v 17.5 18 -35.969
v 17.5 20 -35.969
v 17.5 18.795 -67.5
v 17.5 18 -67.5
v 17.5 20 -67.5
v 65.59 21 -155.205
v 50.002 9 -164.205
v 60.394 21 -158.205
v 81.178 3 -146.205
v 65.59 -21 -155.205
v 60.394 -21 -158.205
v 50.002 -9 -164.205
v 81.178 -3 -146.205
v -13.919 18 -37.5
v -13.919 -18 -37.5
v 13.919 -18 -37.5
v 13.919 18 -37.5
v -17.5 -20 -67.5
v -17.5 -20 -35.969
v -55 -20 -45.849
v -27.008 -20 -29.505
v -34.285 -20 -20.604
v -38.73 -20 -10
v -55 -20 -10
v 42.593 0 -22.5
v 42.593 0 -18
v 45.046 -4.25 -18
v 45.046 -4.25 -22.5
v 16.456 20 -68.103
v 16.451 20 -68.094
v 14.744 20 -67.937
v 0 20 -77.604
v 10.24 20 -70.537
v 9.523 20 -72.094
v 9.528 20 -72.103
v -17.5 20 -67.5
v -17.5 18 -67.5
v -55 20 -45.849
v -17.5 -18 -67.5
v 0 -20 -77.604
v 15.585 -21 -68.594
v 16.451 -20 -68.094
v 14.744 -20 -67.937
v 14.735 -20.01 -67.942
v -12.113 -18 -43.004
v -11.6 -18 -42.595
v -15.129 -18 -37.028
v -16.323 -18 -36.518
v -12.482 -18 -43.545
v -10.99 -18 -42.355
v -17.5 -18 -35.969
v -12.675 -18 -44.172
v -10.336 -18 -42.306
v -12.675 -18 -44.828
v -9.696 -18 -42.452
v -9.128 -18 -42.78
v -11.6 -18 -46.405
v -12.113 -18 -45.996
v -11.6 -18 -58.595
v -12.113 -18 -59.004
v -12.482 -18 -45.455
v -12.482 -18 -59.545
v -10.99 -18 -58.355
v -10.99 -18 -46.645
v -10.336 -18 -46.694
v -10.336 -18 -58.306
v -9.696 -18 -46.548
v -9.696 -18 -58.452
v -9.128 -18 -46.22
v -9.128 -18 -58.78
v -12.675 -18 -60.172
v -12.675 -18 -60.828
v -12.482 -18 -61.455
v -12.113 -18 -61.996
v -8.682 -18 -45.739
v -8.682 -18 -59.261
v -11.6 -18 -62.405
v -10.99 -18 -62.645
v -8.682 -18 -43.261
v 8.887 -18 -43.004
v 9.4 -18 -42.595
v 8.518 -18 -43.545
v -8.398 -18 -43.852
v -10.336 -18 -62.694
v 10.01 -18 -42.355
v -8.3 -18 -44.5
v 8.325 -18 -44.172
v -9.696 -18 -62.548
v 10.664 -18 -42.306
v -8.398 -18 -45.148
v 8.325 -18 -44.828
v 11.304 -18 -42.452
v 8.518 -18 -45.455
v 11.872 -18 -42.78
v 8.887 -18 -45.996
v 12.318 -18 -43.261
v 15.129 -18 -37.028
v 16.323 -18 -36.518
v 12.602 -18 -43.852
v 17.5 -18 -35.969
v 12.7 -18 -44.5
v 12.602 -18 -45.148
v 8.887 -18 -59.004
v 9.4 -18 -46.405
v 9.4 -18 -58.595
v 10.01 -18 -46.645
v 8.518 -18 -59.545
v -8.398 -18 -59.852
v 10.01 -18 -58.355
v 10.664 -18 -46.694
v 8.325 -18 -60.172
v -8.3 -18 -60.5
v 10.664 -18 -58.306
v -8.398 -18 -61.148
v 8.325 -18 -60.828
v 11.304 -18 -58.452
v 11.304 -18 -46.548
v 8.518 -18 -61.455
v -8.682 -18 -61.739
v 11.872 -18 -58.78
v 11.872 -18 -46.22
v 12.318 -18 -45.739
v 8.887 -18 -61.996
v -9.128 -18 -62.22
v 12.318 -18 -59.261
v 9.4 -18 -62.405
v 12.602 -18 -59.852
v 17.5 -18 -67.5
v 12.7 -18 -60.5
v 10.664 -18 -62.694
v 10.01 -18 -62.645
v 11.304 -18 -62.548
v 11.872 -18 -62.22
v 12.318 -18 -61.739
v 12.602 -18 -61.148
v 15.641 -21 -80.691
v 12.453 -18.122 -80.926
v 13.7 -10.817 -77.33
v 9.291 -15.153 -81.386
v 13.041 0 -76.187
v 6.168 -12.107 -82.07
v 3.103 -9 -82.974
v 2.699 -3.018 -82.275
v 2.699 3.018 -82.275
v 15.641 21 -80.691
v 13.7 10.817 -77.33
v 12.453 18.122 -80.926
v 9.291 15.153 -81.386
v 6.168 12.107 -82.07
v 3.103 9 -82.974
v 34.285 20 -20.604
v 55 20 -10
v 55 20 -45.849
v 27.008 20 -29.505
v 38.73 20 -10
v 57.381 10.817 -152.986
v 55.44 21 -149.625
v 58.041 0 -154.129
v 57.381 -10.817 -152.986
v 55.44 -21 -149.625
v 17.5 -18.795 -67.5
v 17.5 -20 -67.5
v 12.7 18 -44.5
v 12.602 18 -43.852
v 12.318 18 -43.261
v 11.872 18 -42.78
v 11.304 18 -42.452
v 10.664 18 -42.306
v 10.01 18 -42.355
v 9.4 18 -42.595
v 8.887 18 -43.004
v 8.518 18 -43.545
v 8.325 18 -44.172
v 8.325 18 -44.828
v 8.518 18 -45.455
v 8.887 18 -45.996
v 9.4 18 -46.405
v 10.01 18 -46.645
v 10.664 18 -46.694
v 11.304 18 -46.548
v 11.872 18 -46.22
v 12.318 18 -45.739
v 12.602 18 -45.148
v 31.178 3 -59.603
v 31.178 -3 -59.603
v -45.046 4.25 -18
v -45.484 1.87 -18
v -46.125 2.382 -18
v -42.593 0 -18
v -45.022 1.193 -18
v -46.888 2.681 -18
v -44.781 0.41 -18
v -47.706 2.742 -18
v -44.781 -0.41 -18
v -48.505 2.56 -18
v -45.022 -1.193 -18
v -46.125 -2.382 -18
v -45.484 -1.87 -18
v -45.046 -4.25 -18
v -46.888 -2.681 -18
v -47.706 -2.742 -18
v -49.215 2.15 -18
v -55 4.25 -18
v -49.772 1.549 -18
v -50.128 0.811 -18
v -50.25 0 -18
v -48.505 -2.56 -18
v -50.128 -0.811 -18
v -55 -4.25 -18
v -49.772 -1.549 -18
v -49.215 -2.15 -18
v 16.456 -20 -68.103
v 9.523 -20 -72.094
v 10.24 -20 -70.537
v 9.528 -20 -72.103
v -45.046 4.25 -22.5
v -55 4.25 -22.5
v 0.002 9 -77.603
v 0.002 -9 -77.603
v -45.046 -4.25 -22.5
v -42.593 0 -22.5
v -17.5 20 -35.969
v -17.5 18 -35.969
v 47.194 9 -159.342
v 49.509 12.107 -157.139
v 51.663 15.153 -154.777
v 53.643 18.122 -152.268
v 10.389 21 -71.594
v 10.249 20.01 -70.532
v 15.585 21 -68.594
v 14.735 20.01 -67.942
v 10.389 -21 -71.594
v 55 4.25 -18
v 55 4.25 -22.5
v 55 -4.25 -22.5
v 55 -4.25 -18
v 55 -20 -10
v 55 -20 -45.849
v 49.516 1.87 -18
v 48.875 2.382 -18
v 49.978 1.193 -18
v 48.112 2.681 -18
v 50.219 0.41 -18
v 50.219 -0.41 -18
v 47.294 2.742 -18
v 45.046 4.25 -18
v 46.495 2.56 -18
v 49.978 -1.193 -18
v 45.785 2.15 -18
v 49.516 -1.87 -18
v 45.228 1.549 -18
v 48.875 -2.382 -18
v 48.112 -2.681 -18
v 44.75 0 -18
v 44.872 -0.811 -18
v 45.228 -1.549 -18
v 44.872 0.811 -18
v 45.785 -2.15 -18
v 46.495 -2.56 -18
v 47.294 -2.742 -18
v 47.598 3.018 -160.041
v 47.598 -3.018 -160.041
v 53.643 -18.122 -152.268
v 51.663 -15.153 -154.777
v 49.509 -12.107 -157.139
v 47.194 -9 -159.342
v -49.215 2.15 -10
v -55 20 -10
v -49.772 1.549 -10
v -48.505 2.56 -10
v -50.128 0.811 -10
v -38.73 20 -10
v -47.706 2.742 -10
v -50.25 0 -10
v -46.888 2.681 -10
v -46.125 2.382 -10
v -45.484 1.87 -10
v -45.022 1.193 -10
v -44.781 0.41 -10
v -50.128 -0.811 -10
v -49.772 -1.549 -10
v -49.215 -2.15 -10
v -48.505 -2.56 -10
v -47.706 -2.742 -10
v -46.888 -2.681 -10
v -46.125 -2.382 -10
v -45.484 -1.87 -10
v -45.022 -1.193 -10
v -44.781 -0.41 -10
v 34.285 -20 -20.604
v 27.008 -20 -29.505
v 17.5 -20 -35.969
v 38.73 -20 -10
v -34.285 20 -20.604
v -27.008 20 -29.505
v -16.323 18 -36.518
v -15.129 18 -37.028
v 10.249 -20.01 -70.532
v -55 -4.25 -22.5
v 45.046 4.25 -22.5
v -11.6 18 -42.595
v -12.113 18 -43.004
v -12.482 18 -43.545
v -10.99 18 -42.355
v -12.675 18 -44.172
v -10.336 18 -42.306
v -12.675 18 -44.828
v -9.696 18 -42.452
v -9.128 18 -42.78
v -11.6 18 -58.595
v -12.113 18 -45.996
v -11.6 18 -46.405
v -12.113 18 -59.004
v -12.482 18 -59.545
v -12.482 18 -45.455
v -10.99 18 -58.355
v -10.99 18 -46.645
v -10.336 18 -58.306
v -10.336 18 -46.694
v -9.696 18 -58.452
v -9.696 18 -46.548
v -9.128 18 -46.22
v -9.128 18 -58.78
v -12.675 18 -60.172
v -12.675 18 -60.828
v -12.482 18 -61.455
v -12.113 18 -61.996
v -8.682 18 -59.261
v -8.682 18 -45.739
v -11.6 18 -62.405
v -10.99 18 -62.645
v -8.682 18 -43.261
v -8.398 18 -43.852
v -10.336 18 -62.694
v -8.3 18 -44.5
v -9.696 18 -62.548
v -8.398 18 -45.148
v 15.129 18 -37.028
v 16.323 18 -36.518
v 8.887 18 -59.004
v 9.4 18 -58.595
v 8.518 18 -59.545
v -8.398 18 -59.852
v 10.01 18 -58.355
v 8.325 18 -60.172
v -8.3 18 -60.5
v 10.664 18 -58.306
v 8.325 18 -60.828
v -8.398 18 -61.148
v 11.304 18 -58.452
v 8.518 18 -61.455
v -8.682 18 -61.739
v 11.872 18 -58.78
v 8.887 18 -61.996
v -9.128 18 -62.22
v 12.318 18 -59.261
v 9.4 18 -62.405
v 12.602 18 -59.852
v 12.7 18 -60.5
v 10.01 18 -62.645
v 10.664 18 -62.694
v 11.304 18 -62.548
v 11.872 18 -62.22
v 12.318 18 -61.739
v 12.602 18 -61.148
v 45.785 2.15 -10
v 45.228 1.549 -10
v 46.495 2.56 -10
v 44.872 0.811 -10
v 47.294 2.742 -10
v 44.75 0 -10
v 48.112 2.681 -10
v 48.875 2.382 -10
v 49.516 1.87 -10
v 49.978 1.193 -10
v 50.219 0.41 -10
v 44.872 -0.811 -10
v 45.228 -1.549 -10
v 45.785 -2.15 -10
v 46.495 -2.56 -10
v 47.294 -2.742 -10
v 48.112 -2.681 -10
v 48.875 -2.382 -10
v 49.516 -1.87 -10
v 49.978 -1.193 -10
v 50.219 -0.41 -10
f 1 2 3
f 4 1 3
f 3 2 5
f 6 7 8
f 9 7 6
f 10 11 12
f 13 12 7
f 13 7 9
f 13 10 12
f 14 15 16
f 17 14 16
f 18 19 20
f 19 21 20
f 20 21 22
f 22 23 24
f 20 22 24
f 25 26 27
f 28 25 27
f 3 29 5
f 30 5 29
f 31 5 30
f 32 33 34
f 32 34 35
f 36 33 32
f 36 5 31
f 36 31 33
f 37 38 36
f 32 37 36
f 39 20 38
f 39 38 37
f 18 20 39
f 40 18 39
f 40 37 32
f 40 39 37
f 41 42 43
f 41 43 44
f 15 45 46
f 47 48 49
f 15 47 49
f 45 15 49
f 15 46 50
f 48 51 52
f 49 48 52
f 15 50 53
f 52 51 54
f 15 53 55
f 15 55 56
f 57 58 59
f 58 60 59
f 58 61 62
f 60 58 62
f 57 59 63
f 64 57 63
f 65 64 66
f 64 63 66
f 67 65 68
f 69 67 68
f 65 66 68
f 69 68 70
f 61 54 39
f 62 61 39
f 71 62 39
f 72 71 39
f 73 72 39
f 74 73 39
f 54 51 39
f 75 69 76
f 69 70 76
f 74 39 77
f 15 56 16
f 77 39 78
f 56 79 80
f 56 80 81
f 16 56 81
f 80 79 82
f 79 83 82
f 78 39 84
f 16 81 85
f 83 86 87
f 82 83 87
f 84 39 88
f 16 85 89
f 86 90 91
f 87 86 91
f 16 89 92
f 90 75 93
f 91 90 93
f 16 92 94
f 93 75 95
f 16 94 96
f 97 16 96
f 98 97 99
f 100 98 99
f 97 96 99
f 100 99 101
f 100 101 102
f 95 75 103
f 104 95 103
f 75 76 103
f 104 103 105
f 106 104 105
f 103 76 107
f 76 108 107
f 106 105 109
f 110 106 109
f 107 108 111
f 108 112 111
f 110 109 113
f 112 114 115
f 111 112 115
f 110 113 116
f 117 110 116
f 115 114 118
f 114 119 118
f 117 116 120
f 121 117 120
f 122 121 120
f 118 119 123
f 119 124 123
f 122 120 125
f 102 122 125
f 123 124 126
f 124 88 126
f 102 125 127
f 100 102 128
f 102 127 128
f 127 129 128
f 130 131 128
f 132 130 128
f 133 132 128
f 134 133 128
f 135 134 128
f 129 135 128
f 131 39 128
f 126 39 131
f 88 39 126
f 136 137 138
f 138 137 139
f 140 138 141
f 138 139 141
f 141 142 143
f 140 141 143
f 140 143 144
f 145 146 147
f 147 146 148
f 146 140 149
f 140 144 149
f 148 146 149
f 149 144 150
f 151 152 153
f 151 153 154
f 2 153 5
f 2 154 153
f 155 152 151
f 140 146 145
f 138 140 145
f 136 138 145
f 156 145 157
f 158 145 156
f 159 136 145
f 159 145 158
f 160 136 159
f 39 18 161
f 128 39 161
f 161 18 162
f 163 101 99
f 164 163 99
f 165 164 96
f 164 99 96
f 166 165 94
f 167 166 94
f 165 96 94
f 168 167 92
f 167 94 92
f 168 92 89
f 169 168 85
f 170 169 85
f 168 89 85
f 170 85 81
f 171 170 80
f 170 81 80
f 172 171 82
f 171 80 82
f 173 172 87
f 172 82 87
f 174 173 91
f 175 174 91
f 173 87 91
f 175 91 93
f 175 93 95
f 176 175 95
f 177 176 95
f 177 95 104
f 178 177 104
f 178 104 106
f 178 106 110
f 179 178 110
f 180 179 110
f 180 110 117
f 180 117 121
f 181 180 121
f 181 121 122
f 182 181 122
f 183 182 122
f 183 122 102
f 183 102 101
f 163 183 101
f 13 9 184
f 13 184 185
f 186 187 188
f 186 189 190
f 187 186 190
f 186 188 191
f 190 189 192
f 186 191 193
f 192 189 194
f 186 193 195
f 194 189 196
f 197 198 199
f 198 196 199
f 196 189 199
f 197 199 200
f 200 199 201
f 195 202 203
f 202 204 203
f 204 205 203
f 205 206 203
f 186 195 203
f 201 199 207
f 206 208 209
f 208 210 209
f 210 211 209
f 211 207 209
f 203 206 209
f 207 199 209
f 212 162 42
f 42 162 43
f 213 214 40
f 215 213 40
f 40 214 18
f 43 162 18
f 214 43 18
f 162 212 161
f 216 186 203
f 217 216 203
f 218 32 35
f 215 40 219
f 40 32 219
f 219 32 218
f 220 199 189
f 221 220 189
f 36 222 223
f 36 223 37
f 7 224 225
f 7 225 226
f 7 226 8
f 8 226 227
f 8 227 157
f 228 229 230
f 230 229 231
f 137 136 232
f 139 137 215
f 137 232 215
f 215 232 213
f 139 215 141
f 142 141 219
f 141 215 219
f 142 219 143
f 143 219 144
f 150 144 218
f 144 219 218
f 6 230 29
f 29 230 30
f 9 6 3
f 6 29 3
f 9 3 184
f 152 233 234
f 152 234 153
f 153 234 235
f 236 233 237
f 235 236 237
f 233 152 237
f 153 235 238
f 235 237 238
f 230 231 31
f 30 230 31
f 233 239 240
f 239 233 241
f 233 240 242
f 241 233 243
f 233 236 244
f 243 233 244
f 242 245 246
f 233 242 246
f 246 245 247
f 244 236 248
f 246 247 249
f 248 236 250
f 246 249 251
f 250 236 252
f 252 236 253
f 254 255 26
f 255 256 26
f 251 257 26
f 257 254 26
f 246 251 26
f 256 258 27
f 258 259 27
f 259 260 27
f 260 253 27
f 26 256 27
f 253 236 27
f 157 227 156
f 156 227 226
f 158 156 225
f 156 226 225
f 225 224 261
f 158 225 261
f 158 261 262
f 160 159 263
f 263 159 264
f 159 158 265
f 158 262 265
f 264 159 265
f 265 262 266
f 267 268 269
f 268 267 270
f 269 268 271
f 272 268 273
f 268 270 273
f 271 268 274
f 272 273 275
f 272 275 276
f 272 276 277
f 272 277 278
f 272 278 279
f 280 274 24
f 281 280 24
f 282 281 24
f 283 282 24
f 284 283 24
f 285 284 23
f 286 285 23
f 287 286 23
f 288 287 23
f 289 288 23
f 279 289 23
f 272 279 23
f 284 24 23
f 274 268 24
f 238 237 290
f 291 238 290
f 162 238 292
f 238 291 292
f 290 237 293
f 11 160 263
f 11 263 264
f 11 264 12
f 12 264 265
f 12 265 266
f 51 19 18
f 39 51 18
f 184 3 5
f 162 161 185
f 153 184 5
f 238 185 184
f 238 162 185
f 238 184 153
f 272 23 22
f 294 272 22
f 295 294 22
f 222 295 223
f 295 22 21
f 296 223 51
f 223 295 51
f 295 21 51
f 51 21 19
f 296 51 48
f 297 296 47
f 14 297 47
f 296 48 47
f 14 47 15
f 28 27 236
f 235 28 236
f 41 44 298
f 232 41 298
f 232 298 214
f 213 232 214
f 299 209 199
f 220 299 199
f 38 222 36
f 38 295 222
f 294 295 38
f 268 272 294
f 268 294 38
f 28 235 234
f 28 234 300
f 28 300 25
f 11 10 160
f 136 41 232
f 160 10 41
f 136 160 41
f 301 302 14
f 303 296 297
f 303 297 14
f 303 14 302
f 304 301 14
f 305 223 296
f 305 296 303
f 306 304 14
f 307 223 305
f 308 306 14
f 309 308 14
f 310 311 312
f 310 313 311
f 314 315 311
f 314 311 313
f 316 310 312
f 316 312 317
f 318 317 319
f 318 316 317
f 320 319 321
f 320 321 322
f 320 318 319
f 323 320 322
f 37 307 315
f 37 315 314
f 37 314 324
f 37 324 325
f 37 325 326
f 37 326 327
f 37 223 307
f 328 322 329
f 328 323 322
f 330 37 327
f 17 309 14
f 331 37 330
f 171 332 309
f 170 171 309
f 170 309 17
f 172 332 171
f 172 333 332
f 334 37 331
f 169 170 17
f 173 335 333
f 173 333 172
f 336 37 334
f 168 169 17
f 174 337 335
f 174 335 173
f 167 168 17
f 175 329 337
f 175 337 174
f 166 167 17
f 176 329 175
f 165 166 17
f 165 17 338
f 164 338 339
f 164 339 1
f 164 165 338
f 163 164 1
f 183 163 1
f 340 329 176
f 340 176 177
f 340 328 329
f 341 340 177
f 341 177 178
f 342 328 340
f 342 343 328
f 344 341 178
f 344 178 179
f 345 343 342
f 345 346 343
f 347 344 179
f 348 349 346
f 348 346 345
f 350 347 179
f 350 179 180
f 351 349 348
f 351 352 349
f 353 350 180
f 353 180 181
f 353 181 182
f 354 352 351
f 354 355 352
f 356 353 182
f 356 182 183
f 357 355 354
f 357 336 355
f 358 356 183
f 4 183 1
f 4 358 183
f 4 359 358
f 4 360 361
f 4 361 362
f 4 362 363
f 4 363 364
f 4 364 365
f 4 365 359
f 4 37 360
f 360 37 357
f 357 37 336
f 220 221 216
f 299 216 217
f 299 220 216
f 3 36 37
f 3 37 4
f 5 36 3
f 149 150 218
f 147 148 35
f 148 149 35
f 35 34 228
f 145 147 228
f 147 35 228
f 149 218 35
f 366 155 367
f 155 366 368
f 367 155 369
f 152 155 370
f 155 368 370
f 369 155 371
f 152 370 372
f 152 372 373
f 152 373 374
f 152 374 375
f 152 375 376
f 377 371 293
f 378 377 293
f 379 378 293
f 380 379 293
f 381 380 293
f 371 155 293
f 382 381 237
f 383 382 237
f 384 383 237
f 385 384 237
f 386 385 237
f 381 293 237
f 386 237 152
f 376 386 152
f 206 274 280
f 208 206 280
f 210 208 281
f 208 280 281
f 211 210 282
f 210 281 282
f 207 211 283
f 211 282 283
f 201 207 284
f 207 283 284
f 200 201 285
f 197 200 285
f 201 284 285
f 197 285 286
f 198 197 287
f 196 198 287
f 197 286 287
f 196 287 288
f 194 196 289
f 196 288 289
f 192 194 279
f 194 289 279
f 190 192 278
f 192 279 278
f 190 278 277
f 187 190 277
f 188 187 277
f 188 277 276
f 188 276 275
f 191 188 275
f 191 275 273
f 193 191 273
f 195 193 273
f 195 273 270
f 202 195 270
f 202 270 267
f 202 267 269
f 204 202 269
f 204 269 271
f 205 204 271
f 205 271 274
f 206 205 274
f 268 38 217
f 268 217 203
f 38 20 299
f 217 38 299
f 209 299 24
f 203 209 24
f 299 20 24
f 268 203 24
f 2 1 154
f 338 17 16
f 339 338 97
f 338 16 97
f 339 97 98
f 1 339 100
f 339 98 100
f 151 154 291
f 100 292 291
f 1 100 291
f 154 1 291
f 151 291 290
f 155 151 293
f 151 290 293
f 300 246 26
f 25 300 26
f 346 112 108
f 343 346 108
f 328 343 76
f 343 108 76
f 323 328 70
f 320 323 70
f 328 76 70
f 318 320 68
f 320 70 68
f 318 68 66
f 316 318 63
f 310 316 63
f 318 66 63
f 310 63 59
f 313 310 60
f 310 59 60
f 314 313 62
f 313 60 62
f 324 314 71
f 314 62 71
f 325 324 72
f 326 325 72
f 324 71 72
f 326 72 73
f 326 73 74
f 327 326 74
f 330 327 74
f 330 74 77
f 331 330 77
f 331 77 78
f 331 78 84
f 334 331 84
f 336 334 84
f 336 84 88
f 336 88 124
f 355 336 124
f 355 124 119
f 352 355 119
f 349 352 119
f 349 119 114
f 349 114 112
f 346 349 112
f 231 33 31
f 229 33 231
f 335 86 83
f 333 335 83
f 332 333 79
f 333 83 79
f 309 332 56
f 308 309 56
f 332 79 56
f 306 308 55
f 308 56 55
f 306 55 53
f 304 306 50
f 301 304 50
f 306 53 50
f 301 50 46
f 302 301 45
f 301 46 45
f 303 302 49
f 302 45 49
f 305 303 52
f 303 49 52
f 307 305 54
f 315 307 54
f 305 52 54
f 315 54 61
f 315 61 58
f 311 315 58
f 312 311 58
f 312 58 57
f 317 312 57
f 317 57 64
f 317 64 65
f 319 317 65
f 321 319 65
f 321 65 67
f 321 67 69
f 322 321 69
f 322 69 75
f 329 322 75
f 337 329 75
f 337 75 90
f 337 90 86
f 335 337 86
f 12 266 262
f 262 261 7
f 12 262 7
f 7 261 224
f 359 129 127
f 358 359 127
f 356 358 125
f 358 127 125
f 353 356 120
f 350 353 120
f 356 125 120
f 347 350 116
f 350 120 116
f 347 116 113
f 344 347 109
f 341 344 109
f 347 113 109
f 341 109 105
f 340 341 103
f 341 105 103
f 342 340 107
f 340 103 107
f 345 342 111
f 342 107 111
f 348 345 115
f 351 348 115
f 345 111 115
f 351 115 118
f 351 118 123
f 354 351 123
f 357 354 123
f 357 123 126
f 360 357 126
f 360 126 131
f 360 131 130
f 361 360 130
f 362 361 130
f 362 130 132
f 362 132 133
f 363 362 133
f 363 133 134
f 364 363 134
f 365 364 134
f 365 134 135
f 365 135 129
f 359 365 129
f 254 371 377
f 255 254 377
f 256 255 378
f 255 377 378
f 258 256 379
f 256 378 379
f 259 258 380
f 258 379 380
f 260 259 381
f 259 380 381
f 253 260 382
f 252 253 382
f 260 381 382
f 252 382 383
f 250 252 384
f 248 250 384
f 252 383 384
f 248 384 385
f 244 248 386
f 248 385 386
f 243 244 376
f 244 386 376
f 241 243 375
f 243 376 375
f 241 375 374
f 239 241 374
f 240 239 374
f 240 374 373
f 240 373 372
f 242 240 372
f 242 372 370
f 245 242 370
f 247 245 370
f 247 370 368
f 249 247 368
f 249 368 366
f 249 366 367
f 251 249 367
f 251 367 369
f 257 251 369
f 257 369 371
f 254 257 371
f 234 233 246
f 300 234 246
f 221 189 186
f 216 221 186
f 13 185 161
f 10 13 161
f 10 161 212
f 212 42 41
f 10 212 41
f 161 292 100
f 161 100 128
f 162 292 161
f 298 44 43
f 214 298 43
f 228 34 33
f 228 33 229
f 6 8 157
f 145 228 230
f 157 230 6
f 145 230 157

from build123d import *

# Parameters (mm, degrees)
PAD_DEPTH       = 20
SKETCH003_R     = 2.2
HOLE_DEPTH      = 40.001
POCKET001_DEPTH = 4.5
SKETCH007_R     = 2.75
HOLE001_DEPTH   = 12
PAD001_DEPTH    = 101
SKETCH011_R     = 45
HOLE002_DEPTH   = 12
CHAMFER_SIZE    = 0.99
SKETCH009_W     = 35
SKETCH009_H     = 67.5
POCKET_DEPTH    = 2


with BuildPart() as part:
    # Sketch → Pad (new body, symmetric)
    with BuildSketch(Plane.XZ):
        with BuildLine():
            ThreePointArc((13.9194109071, -37.5), (29.6992968462, -26.794621976), (38.7298334621, -10))
            Line((38.7298334621, -10), (55, -10))
            Line((55, -10), (55, -45.8493649054))
            Line((0, -77.6036297108), (55, -45.8493649054))
            Line((-55, -45.8493649054), (0, -77.6036297108))
            Line((-55, -45.8493649054), (-55, -10))
            Line((-55, -10), (-38.7298334621, -10))
            ThreePointArc((-38.7298334621, -10), (-29.6992968462, -26.794621976), (-13.9194109071, -37.5))
            Line((-13.9194109071, -37.5), (13.9194109071, -37.5))
        make_face()
    extrude(amount=PAD_DEPTH, both=True)

    # Sketch003 → Hole (cut, through all)
    with BuildSketch(Plane.XZ.offset(20)):
        with Locations((-10.5, -44.5)):
            Circle(SKETCH003_R)
        with Locations((10.5, -44.5)):
            Circle(SKETCH003_R)
        with Locations((-10.5, -60.5)):
            Circle(SKETCH003_R)
        with Locations((10.5, -60.5)):
            Circle(SKETCH003_R)
    extrude(amount=-HOLE_DEPTH, mode=Mode.SUBTRACT)

    # Sketch006 → Pocket001 (cut)
    with BuildSketch(Plane(origin=(0, 0, -18), x_dir=(-1, 0, 0), z_dir=(0, 0, 1))):
        Polygon((55, 4.25), (45.0462616441, 4.25), (42.592523, 0), (45.0462616441, -4.25), (55, -4.25), align=None)
        Polygon((-55, 4.25), (-55, -4.25), (-45.0462616441, -4.25), (-42.592523, 0), (-45.0462616441, 4.25), align=None)
    extrude(amount=-POCKET001_DEPTH, mode=Mode.SUBTRACT)

    # Sketch007 (on Face5 of Pocket001) → Hole001 (cut)
    with BuildSketch(Plane(origin=(0, 0, -10), x_dir=(-1, 0, 0), z_dir=(0, 0, 1))):
        with Locations((47.5, 0)):
            Circle(SKETCH007_R)
        with Locations((-47.5, 0)):
            Circle(SKETCH007_R)
    extrude(amount=-HOLE001_DEPTH, mode=Mode.SUBTRACT)

    # Sketch010 (on Face10 of Hole001) → Pad001 (join)
    with BuildSketch(Plane(origin=(33.1033573777, 0, -57.3366968793), x_dir=(0.8660254038, 0, 0.5), z_dir=(0.5, 0, -0.8660254038))):
        Polygon((-38.8, 9), (-38.8, -9), (-26.8, -21), (-20.8, -21), (-2.8, -3), (-2.8, 3), (-20.8, 21), (-26.8, 21), align=None)
    extrude(amount=PAD001_DEPTH)

    # Sketch011 (on Face30 of Pad001) → Hole002 (cut)
    with BuildSketch(Plane(origin=(-33.6017856668, 0, -19.4), x_dir=(0.5, 0, -0.8660254038), z_dir=(-0.8660254038, 0, -0.5))):
        with Locations((117.5, 0)):
            Circle(SKETCH011_R)
    extrude(amount=-HOLE002_DEPTH, mode=Mode.SUBTRACT)

    # Chamfer
    chamfer_edges = [part.edges().sort_by_distance(p)[0] for p in [
        (9.460864, 20.5, -70.986697),
        (12.491953, 21, -69.236697),
        (15.523042, 20.5, -67.486697),
        (15.523042, -20.5, -67.486697),
        (12.491953, -21, -69.236697),
        (9.460864, -20.5, -70.986697),
    ]]
    chamfer(chamfer_edges, length=CHAMFER_SIZE)

    # Sketch009 → Pocket (cut)
    with BuildSketch(Plane(origin=(0, 20, 0), x_dir=(1, 0, 0), z_dir=(0, 1, 0))):
        with Locations((0, 33.75)):
            Rectangle(SKETCH009_W, SKETCH009_H)
    pocket = extrude(amount=-POCKET_DEPTH, mode=Mode.SUBTRACT)

    # Mirrored: Pocket across XZ
    add(pocket.mirror(Plane.XZ), mode=Mode.SUBTRACT)


solid = part.part
